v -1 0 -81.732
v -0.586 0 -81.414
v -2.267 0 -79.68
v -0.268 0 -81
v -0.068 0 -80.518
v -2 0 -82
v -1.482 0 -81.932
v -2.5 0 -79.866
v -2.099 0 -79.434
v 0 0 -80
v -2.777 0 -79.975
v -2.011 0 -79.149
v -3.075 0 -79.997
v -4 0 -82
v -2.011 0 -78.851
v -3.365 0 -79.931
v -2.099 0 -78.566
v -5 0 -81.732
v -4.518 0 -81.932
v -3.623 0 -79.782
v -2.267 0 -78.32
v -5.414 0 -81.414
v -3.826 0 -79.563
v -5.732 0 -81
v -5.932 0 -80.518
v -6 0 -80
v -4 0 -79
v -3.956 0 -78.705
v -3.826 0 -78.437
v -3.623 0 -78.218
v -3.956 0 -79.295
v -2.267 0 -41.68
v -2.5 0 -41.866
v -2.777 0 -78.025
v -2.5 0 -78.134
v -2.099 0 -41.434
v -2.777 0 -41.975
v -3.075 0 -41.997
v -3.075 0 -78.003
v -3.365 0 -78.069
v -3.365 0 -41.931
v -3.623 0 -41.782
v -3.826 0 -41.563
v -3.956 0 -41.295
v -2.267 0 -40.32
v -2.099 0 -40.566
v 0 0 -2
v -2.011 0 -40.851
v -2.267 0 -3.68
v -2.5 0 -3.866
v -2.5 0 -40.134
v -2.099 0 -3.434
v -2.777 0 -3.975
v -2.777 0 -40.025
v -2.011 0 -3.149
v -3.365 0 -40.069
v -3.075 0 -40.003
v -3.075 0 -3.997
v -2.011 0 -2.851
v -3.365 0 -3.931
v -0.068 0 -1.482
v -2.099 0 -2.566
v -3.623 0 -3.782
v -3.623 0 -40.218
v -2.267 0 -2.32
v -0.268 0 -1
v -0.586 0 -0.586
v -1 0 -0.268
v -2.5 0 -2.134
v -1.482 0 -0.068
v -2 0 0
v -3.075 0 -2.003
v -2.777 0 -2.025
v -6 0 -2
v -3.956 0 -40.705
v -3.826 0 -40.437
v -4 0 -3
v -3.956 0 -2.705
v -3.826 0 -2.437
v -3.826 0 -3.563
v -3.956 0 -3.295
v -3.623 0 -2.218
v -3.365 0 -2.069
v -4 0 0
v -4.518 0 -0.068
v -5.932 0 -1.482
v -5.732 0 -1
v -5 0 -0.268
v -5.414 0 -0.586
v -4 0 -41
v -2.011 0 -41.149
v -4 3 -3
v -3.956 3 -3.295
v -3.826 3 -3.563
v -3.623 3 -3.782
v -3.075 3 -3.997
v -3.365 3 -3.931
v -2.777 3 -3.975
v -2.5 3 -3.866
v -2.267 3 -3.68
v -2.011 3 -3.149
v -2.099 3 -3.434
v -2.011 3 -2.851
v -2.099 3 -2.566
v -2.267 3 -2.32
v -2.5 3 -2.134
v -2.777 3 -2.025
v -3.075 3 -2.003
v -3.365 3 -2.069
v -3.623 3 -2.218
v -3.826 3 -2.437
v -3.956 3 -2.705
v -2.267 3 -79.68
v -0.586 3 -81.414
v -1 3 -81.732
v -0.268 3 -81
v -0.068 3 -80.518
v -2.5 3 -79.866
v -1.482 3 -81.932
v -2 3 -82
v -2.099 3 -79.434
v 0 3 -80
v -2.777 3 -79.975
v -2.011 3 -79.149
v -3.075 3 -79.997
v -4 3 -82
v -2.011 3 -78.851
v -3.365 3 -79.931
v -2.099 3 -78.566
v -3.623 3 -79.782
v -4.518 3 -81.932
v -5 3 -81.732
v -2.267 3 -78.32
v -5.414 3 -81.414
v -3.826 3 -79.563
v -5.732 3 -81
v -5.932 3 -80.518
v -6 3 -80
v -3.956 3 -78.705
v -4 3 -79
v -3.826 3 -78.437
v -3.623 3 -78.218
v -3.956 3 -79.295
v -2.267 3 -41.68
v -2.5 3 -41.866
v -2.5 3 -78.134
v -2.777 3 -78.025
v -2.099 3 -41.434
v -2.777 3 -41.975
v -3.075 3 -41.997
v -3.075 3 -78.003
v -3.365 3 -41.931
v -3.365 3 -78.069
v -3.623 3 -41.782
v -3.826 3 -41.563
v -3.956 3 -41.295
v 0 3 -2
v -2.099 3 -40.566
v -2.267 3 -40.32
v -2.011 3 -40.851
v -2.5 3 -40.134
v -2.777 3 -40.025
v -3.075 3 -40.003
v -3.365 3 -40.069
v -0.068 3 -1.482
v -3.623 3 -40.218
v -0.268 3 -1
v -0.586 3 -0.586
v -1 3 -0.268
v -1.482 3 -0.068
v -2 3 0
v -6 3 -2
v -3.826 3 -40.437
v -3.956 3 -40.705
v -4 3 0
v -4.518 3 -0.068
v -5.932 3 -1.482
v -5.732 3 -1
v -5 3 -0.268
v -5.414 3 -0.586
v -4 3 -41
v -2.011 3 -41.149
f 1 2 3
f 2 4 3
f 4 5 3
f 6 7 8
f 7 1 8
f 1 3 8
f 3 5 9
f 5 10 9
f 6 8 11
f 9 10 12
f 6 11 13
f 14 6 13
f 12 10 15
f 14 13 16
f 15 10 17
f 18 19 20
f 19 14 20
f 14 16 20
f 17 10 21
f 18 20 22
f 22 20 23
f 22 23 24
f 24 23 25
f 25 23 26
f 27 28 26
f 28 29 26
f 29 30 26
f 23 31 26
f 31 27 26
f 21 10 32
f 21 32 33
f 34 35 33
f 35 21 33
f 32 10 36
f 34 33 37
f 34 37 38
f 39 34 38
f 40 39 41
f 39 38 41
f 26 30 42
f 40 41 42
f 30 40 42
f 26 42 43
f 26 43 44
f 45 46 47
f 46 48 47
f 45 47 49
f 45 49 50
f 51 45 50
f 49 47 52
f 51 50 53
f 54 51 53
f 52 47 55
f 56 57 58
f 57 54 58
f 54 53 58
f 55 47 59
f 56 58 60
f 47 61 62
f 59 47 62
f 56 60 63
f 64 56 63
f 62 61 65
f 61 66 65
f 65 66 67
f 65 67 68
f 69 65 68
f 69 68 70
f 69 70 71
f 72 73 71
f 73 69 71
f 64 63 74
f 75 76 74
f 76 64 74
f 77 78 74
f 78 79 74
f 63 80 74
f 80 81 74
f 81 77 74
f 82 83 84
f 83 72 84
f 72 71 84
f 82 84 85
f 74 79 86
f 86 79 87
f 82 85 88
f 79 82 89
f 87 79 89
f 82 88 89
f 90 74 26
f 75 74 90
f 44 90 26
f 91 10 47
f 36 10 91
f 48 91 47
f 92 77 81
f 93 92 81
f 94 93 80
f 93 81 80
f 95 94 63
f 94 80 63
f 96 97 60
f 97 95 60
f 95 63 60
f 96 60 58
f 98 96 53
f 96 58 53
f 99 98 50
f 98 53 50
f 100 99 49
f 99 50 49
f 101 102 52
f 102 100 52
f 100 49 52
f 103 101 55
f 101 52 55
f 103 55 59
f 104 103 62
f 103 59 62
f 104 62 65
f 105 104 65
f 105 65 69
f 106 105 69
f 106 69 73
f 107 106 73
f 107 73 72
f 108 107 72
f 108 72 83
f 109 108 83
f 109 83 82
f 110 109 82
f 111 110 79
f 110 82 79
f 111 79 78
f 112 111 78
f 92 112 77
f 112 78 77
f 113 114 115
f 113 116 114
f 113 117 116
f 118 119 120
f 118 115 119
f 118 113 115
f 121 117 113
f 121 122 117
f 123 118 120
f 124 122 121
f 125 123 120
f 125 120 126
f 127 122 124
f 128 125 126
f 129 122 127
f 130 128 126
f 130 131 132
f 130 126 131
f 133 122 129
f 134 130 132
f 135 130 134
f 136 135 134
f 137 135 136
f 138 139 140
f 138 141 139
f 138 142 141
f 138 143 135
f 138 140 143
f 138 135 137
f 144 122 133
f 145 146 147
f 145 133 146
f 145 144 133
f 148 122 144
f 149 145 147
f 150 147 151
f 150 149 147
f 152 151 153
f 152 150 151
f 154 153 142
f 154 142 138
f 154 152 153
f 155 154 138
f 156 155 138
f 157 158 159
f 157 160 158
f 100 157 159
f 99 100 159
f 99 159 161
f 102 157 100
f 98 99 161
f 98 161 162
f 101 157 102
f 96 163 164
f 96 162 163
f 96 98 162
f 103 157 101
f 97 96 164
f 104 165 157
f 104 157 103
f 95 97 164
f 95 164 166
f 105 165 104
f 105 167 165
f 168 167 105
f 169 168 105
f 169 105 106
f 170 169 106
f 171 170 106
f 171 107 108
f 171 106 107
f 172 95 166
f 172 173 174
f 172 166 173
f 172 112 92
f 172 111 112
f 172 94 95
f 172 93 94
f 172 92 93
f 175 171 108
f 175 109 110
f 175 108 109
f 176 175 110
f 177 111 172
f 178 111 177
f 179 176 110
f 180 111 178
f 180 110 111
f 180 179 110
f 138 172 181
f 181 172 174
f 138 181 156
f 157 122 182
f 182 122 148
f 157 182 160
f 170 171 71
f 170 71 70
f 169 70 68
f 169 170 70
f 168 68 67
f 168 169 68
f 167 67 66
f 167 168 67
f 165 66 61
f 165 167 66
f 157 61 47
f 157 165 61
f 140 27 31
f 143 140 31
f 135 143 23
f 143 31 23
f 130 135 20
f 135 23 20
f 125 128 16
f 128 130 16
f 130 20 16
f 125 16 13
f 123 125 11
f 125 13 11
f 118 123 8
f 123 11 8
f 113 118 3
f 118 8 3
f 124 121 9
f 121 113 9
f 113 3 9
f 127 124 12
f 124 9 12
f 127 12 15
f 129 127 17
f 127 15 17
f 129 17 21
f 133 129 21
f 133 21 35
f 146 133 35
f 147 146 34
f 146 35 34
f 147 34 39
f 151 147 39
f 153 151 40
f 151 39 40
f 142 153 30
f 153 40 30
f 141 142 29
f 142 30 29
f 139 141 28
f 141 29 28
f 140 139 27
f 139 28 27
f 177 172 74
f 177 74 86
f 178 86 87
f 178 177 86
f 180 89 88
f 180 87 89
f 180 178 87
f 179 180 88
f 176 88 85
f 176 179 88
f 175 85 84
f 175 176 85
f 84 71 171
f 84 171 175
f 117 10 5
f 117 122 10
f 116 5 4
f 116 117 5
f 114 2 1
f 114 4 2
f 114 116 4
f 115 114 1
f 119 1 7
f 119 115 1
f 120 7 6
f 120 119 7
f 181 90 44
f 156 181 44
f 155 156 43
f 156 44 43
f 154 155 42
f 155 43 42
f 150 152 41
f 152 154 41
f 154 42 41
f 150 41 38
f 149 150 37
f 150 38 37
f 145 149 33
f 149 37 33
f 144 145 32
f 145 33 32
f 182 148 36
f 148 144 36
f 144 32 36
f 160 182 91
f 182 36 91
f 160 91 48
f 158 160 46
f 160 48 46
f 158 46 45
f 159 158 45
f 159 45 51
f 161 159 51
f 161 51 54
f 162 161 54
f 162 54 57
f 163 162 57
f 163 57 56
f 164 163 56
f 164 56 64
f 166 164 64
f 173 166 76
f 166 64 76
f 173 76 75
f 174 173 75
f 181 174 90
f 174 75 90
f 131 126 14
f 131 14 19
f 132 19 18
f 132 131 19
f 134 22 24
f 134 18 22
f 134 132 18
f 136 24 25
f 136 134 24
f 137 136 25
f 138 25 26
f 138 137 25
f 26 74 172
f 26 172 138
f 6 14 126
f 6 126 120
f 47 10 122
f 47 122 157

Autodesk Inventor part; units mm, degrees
ref_plane "YZ Plane" through (0, 0, 0) normal (1, 0, 0) x (0, 1, 0)
ref_plane "XZ Plane" through (0, 0, 0) normal (0, 1, 0) x (-1, 0, 0)
ref_plane "XY Plane" through (0, 0, 0) normal (0, 0, 1) x (1, 0, 0)
sketch "Sketch1" plane through (0, 0, 0) normal (0, 1, 0) x (-1, 0, 0)
  line L0 (0, 0) -> (6, 0)
  line L1 (6, 0) -> (6, -82)
  line L2 (6, -82) -> (0, -82)
  line L3 (0, -82) -> (0, 0)
  circle A0 centre (3, -3) radius 1
  circle A1 centre (3, -79) radius 1
  circle A2 centre (3, -41) radius 1
  point P0 (3, 0)
  point P1 (6, -41)
  dimension "d0" = 6
  dimension "d1" = 82
  dimension "d2" = 2
  dimension "d3" = 2
  dimension "d4" = 76
  dimension "d5" = 3
  dimension "d6" = 3
  dimension "d7" = 3
  dimension "d11" = 2
  dimension "d12" = 3
  dimension "d13" = 41
extrude "Extrusion1" add sketch "Sketch1" along normal blind 3
fillet "Fillet1" radius 2 4 edges at (0, 1.5, 0) (-6, 1.5, 0) (0, 1.5, -82) (-6, 1.5, -82)
equation "\"d6\" = 0.5 * d0"
equation "\"d7\" = d6"
equation "\"d12\" = 0.5 * d0"
equation "\"d13\" = 0.5 * d1"
properties part number "Steering_Linkage"
